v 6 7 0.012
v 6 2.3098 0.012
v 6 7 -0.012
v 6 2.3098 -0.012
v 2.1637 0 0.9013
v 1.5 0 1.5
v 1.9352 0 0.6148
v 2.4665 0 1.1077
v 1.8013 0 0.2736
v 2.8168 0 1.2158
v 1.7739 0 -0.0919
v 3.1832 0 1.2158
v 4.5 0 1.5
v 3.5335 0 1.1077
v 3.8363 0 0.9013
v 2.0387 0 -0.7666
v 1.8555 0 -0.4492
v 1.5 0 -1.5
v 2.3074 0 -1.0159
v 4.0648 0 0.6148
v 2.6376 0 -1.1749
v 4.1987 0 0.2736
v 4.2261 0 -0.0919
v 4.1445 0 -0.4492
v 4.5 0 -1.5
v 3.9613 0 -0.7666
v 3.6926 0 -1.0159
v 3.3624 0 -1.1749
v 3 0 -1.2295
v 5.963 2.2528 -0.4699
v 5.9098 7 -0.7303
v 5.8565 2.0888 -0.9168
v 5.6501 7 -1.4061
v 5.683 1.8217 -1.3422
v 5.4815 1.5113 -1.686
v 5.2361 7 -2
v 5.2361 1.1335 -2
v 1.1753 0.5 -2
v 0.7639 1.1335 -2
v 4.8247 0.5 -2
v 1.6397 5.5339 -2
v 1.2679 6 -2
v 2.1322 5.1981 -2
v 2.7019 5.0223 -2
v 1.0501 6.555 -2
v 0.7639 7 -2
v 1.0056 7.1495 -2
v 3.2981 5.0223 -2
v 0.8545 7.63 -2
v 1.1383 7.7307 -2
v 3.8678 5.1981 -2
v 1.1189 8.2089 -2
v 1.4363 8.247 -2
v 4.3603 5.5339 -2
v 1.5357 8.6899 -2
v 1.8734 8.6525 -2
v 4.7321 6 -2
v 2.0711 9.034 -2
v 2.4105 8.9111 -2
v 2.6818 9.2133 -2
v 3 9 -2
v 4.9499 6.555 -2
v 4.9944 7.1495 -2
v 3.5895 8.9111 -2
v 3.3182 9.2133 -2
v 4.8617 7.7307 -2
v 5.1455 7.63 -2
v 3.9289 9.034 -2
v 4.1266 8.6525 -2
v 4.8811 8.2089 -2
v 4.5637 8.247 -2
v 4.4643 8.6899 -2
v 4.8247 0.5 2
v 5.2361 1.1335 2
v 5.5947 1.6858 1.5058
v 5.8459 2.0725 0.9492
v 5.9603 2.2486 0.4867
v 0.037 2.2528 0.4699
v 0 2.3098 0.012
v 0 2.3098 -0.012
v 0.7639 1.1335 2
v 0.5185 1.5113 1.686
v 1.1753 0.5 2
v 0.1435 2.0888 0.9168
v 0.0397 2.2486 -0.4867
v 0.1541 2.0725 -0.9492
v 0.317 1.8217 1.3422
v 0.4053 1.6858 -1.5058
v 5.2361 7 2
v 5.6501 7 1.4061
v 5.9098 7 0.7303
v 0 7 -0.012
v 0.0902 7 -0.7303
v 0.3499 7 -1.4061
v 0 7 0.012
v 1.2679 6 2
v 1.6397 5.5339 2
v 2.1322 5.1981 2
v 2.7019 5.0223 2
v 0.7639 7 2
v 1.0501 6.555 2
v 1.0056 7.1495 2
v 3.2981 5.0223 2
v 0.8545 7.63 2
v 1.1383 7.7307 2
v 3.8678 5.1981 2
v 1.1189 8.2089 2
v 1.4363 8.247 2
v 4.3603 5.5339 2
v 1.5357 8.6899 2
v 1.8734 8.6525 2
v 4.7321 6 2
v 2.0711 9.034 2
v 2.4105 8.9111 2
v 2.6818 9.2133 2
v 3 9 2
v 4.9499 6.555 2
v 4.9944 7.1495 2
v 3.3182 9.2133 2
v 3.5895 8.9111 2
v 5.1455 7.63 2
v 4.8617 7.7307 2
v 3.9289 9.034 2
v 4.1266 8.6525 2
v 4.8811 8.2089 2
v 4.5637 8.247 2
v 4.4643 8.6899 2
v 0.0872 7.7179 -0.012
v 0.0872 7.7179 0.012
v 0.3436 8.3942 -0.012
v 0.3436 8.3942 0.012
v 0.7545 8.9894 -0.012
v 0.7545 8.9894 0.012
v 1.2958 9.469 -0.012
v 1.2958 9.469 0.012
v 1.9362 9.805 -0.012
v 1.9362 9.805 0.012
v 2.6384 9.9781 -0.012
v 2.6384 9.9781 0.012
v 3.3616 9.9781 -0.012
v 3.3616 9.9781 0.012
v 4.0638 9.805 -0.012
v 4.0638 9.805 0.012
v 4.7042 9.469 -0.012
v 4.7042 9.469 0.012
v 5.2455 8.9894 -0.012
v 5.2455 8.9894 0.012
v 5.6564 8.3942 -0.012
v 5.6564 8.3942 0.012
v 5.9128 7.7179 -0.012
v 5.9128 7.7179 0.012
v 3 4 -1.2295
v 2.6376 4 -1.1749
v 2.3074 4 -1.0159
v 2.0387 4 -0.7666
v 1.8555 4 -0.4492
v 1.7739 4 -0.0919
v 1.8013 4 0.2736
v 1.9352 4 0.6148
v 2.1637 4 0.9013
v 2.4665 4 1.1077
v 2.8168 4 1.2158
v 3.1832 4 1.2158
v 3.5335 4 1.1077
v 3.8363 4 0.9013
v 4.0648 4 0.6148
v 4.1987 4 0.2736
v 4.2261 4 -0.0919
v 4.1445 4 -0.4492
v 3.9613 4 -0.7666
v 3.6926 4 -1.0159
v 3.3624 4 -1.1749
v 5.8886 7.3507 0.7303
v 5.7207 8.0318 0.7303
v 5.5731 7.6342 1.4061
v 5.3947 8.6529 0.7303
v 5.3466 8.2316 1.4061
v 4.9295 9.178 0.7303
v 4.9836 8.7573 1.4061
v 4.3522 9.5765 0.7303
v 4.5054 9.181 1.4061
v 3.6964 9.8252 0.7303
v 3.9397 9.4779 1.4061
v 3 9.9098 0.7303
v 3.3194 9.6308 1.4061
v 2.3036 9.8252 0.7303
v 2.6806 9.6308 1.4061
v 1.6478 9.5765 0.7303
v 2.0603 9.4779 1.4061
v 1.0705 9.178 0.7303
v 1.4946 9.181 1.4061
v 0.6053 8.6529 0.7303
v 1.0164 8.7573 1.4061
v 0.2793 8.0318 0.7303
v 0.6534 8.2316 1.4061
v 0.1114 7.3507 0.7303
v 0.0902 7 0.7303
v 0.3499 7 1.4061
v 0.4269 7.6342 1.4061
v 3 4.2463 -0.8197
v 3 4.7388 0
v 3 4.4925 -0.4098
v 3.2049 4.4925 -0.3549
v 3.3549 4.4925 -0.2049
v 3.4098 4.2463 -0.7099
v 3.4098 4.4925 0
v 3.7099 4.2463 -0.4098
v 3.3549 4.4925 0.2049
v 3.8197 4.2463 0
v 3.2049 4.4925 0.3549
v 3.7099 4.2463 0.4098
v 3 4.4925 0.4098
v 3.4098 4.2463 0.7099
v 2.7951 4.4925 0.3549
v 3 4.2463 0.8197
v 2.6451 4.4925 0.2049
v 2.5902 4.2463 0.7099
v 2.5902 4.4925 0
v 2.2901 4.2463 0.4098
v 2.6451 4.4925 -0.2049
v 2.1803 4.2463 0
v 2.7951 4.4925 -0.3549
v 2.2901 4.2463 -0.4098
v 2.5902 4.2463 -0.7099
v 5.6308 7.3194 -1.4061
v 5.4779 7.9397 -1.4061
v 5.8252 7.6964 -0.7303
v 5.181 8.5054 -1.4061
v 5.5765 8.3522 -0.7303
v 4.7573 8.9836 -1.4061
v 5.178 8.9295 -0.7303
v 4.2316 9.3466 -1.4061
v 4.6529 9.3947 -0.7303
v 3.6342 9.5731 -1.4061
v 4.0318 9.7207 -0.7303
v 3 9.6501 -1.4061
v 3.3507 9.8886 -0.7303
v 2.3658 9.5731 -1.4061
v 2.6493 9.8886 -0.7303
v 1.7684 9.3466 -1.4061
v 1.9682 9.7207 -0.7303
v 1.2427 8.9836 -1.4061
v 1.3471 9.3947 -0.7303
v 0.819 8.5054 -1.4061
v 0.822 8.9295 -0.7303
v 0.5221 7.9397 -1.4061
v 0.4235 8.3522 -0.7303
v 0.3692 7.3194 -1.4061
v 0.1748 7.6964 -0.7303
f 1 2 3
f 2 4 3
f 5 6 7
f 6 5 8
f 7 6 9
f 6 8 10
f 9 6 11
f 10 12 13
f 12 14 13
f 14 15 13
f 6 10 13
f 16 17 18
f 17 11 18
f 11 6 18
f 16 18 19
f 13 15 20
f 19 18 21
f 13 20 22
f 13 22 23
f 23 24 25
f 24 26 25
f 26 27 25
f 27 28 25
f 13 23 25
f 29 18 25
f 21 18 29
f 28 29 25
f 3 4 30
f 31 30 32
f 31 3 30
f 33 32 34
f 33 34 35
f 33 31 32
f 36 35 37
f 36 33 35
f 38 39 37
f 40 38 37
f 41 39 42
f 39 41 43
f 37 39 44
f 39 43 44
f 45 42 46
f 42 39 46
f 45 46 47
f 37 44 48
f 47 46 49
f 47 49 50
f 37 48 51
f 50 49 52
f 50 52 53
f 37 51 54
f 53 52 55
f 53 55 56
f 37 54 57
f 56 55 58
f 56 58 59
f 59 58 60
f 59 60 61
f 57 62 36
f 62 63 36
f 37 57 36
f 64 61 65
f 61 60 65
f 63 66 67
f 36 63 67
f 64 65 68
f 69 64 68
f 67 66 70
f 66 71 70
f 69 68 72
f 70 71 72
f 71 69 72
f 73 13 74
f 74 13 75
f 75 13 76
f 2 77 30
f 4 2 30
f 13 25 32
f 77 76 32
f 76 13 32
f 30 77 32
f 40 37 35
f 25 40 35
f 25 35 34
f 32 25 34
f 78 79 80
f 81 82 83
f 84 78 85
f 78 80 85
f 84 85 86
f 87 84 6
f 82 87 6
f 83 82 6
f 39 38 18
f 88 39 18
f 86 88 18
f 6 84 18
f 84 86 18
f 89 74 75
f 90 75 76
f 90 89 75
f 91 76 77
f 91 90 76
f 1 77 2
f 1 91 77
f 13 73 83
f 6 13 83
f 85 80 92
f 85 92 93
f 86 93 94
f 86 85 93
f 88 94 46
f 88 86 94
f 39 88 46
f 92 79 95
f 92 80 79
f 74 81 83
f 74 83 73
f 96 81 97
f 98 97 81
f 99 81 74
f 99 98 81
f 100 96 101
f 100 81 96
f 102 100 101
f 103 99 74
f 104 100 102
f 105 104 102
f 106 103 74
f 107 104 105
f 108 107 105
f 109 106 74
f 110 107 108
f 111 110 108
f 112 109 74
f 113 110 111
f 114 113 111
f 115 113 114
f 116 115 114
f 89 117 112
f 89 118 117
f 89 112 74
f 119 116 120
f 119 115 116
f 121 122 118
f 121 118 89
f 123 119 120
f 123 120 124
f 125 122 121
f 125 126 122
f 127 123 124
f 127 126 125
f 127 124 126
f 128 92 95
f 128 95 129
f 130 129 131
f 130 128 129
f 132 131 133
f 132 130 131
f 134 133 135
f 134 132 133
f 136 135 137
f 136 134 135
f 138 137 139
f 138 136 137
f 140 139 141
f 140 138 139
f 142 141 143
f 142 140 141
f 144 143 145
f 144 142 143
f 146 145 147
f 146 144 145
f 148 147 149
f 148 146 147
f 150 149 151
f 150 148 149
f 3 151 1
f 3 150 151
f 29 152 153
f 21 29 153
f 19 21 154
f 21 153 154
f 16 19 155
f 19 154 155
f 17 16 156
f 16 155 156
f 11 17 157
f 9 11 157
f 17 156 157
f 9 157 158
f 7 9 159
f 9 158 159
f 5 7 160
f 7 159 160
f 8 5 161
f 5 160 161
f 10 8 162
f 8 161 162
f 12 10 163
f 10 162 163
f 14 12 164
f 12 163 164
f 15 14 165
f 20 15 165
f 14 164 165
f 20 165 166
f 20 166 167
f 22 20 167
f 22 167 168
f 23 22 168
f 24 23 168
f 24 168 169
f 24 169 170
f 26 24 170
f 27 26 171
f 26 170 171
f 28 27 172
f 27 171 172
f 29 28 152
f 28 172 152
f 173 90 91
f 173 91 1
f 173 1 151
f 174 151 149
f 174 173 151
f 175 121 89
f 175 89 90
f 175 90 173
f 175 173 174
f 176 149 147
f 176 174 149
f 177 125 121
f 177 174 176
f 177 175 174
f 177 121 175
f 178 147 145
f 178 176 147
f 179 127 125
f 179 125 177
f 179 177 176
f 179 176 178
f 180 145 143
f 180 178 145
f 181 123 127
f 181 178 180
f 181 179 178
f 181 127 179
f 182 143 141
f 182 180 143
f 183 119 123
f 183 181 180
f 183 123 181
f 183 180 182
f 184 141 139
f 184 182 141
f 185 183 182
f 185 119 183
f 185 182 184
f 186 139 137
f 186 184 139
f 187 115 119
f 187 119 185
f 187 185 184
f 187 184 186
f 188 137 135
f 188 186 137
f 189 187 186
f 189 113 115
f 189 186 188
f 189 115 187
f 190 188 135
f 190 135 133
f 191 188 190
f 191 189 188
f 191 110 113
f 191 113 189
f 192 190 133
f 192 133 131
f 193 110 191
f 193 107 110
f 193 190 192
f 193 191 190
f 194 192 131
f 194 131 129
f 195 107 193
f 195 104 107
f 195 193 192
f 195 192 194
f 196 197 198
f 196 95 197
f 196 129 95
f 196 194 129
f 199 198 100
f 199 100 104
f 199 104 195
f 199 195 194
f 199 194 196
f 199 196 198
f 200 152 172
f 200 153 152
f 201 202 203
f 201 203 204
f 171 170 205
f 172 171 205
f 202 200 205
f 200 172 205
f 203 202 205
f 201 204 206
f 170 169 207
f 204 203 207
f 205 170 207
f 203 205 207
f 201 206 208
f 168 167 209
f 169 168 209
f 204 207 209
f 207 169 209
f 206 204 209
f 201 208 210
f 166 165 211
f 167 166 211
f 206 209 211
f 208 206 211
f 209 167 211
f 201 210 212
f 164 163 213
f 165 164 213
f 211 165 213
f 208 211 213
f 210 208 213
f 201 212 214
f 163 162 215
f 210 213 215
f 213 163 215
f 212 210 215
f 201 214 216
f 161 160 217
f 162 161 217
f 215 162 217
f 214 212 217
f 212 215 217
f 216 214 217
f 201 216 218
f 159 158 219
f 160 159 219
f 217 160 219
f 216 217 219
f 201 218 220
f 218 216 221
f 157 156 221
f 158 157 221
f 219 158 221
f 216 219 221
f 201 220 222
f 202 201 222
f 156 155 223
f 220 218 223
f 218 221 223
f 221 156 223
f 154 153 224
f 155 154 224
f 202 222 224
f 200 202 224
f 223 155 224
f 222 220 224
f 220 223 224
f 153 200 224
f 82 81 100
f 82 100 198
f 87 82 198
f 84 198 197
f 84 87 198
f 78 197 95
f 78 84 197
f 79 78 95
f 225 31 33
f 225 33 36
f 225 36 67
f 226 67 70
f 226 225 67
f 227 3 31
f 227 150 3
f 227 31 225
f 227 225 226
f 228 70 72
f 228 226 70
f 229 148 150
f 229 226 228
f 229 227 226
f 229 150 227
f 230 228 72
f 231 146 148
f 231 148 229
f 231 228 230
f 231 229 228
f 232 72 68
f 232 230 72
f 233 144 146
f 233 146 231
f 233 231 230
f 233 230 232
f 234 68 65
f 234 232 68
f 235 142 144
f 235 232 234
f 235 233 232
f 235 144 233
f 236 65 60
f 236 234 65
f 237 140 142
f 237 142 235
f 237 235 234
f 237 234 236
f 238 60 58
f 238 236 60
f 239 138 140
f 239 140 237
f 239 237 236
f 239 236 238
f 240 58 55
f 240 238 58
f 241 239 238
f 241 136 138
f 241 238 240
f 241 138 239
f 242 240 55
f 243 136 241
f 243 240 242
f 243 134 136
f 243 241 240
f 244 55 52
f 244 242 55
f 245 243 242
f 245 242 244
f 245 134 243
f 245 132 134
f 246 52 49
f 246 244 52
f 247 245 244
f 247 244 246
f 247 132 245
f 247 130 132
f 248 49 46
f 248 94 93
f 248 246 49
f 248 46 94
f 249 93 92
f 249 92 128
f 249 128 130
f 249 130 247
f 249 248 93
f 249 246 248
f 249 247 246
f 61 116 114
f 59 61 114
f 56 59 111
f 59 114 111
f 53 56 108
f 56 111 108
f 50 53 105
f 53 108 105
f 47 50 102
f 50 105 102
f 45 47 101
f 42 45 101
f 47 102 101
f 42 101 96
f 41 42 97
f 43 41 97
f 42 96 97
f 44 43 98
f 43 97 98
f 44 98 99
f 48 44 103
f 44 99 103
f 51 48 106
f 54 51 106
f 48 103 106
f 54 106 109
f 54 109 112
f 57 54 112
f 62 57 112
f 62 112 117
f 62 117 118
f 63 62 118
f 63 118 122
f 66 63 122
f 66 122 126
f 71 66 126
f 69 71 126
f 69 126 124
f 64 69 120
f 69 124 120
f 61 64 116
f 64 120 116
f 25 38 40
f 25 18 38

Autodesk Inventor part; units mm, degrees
ref_plane "YZ Plane" through (0, 0, 0) normal (1, 0, 0) x (0, 1, 0)
ref_plane "XZ Plane" through (0, 0, 0) normal (0, 1, 0) x (-1, 0, 0)
ref_plane "XY Plane" through (0, 0, 0) normal (0, 0, 1) x (1, 0, 0)
sketch "Skizze1" plane through (0, 0, 0) normal (0, 0, 1) x (1, 0, 0)
  line L0 (-1.2, 0) -> (7.2, 0) projected
  line L1 (0, -2) -> (0, 12) projected
  line L2 (0, 7) -> (0, 2.3098)
  line L3 (0, 2.3098) -> (1.5, 0)
  line L4 (1.5, 0) -> (4.5, 0)
  line L5 (4.5, 0) -> (6, 2.3098)
  line L6 (6, 2.3098) -> (6, 7)
  arc A0 (6, 7) -> (0, 7) centre (3, 7) ccw
  point P0 (0, 0)
  dimension "d0" = 33
  dimension "d1" = 33
  dimension "d2" = 3
  dimension "d3" = 10
  dimension "d4" = 1.5
  dimension "d5" = 3
extrude "Extrusion1" add sketch "Skizze1" along normal mid plane 4 contours L3 L1 A0 L6 L5 L0
sketch "Skizze2" plane through (0, 0, -2) normal (0, 0, -1) x (-1, 0, 0)
  arc A0 (0, 7) -> (-6, 7) centre (-3, 7) ccw projected
  point P0 (0, 0)
hole "Bohrung1" at (3, 7, -2) at (3, 7, -2) direction (0, 0, 1) diameter 4 end through all
sketch "Skizze3" plane through (1.5, 0, 2) normal (0, -1, 0) x (1, 0, 0)
  line L0 (-2.7, -2) -> (5.7, -2) projected
  line L1 (-1.5, -4.8) -> (-1.5, 0.8) projected
  point P0 (-1.5, -2)
  point P1 (1.5, -2)
  dimension "d15" = 3
hole "Bohrung2" at (3, 0, 0) direction (0, 1, 0) diameter 2.459 depth 4 tip angle 118
sketch "Skizze4" plane through (1.5, 0, 2) normal (0, -1, 0) x (1, 0, 0)
  arc A0 (3.7361, -4) -> (3.7361, 0) centre (1.5, -2) ccw
  line L0 (3.7361, 0) -> (5.5, 0)
  line L1 (5.5, 0) -> (5.5, -4)
  line L2 (5.5, -4) -> (3.7361, -4)
  line L3 (4.5, -4) -> (3, -4) projected
  line L4 (3, 0) -> (4.5, 0) projected
  line L5 (4.5, -4) -> (4.5, 0) projected
  dimension "d24" = 3
  dimension "d25" = 4
sketch "Skizze5" plane through (0, 0, 2) normal (0, 0, 1) x (1, 0, 0)
  line L0 (6, 0) -> (6, 7)
  line L1 (6, 2.3098) -> (6, 7) projected
  arc A0 (6, 7) -> (0, 7) centre (3, 7) ccw projected
  line L2 (0, 7) -> (0, 2.3098) projected
  arc A1 (6, 7) -> (0, 7) centre (3, 7) ccw
  line L3 (0, 7) -> (0, 0)
sweep "Sweeping2" cut profiles "Skizze4" path "Skizze5" path curves L0 A1 L3
chamfer "Fase2" distance 0.5 angle 45 2 edges at (3, 0, 2) (3, 0, -2)
properties part number "Pleuelkopf"
